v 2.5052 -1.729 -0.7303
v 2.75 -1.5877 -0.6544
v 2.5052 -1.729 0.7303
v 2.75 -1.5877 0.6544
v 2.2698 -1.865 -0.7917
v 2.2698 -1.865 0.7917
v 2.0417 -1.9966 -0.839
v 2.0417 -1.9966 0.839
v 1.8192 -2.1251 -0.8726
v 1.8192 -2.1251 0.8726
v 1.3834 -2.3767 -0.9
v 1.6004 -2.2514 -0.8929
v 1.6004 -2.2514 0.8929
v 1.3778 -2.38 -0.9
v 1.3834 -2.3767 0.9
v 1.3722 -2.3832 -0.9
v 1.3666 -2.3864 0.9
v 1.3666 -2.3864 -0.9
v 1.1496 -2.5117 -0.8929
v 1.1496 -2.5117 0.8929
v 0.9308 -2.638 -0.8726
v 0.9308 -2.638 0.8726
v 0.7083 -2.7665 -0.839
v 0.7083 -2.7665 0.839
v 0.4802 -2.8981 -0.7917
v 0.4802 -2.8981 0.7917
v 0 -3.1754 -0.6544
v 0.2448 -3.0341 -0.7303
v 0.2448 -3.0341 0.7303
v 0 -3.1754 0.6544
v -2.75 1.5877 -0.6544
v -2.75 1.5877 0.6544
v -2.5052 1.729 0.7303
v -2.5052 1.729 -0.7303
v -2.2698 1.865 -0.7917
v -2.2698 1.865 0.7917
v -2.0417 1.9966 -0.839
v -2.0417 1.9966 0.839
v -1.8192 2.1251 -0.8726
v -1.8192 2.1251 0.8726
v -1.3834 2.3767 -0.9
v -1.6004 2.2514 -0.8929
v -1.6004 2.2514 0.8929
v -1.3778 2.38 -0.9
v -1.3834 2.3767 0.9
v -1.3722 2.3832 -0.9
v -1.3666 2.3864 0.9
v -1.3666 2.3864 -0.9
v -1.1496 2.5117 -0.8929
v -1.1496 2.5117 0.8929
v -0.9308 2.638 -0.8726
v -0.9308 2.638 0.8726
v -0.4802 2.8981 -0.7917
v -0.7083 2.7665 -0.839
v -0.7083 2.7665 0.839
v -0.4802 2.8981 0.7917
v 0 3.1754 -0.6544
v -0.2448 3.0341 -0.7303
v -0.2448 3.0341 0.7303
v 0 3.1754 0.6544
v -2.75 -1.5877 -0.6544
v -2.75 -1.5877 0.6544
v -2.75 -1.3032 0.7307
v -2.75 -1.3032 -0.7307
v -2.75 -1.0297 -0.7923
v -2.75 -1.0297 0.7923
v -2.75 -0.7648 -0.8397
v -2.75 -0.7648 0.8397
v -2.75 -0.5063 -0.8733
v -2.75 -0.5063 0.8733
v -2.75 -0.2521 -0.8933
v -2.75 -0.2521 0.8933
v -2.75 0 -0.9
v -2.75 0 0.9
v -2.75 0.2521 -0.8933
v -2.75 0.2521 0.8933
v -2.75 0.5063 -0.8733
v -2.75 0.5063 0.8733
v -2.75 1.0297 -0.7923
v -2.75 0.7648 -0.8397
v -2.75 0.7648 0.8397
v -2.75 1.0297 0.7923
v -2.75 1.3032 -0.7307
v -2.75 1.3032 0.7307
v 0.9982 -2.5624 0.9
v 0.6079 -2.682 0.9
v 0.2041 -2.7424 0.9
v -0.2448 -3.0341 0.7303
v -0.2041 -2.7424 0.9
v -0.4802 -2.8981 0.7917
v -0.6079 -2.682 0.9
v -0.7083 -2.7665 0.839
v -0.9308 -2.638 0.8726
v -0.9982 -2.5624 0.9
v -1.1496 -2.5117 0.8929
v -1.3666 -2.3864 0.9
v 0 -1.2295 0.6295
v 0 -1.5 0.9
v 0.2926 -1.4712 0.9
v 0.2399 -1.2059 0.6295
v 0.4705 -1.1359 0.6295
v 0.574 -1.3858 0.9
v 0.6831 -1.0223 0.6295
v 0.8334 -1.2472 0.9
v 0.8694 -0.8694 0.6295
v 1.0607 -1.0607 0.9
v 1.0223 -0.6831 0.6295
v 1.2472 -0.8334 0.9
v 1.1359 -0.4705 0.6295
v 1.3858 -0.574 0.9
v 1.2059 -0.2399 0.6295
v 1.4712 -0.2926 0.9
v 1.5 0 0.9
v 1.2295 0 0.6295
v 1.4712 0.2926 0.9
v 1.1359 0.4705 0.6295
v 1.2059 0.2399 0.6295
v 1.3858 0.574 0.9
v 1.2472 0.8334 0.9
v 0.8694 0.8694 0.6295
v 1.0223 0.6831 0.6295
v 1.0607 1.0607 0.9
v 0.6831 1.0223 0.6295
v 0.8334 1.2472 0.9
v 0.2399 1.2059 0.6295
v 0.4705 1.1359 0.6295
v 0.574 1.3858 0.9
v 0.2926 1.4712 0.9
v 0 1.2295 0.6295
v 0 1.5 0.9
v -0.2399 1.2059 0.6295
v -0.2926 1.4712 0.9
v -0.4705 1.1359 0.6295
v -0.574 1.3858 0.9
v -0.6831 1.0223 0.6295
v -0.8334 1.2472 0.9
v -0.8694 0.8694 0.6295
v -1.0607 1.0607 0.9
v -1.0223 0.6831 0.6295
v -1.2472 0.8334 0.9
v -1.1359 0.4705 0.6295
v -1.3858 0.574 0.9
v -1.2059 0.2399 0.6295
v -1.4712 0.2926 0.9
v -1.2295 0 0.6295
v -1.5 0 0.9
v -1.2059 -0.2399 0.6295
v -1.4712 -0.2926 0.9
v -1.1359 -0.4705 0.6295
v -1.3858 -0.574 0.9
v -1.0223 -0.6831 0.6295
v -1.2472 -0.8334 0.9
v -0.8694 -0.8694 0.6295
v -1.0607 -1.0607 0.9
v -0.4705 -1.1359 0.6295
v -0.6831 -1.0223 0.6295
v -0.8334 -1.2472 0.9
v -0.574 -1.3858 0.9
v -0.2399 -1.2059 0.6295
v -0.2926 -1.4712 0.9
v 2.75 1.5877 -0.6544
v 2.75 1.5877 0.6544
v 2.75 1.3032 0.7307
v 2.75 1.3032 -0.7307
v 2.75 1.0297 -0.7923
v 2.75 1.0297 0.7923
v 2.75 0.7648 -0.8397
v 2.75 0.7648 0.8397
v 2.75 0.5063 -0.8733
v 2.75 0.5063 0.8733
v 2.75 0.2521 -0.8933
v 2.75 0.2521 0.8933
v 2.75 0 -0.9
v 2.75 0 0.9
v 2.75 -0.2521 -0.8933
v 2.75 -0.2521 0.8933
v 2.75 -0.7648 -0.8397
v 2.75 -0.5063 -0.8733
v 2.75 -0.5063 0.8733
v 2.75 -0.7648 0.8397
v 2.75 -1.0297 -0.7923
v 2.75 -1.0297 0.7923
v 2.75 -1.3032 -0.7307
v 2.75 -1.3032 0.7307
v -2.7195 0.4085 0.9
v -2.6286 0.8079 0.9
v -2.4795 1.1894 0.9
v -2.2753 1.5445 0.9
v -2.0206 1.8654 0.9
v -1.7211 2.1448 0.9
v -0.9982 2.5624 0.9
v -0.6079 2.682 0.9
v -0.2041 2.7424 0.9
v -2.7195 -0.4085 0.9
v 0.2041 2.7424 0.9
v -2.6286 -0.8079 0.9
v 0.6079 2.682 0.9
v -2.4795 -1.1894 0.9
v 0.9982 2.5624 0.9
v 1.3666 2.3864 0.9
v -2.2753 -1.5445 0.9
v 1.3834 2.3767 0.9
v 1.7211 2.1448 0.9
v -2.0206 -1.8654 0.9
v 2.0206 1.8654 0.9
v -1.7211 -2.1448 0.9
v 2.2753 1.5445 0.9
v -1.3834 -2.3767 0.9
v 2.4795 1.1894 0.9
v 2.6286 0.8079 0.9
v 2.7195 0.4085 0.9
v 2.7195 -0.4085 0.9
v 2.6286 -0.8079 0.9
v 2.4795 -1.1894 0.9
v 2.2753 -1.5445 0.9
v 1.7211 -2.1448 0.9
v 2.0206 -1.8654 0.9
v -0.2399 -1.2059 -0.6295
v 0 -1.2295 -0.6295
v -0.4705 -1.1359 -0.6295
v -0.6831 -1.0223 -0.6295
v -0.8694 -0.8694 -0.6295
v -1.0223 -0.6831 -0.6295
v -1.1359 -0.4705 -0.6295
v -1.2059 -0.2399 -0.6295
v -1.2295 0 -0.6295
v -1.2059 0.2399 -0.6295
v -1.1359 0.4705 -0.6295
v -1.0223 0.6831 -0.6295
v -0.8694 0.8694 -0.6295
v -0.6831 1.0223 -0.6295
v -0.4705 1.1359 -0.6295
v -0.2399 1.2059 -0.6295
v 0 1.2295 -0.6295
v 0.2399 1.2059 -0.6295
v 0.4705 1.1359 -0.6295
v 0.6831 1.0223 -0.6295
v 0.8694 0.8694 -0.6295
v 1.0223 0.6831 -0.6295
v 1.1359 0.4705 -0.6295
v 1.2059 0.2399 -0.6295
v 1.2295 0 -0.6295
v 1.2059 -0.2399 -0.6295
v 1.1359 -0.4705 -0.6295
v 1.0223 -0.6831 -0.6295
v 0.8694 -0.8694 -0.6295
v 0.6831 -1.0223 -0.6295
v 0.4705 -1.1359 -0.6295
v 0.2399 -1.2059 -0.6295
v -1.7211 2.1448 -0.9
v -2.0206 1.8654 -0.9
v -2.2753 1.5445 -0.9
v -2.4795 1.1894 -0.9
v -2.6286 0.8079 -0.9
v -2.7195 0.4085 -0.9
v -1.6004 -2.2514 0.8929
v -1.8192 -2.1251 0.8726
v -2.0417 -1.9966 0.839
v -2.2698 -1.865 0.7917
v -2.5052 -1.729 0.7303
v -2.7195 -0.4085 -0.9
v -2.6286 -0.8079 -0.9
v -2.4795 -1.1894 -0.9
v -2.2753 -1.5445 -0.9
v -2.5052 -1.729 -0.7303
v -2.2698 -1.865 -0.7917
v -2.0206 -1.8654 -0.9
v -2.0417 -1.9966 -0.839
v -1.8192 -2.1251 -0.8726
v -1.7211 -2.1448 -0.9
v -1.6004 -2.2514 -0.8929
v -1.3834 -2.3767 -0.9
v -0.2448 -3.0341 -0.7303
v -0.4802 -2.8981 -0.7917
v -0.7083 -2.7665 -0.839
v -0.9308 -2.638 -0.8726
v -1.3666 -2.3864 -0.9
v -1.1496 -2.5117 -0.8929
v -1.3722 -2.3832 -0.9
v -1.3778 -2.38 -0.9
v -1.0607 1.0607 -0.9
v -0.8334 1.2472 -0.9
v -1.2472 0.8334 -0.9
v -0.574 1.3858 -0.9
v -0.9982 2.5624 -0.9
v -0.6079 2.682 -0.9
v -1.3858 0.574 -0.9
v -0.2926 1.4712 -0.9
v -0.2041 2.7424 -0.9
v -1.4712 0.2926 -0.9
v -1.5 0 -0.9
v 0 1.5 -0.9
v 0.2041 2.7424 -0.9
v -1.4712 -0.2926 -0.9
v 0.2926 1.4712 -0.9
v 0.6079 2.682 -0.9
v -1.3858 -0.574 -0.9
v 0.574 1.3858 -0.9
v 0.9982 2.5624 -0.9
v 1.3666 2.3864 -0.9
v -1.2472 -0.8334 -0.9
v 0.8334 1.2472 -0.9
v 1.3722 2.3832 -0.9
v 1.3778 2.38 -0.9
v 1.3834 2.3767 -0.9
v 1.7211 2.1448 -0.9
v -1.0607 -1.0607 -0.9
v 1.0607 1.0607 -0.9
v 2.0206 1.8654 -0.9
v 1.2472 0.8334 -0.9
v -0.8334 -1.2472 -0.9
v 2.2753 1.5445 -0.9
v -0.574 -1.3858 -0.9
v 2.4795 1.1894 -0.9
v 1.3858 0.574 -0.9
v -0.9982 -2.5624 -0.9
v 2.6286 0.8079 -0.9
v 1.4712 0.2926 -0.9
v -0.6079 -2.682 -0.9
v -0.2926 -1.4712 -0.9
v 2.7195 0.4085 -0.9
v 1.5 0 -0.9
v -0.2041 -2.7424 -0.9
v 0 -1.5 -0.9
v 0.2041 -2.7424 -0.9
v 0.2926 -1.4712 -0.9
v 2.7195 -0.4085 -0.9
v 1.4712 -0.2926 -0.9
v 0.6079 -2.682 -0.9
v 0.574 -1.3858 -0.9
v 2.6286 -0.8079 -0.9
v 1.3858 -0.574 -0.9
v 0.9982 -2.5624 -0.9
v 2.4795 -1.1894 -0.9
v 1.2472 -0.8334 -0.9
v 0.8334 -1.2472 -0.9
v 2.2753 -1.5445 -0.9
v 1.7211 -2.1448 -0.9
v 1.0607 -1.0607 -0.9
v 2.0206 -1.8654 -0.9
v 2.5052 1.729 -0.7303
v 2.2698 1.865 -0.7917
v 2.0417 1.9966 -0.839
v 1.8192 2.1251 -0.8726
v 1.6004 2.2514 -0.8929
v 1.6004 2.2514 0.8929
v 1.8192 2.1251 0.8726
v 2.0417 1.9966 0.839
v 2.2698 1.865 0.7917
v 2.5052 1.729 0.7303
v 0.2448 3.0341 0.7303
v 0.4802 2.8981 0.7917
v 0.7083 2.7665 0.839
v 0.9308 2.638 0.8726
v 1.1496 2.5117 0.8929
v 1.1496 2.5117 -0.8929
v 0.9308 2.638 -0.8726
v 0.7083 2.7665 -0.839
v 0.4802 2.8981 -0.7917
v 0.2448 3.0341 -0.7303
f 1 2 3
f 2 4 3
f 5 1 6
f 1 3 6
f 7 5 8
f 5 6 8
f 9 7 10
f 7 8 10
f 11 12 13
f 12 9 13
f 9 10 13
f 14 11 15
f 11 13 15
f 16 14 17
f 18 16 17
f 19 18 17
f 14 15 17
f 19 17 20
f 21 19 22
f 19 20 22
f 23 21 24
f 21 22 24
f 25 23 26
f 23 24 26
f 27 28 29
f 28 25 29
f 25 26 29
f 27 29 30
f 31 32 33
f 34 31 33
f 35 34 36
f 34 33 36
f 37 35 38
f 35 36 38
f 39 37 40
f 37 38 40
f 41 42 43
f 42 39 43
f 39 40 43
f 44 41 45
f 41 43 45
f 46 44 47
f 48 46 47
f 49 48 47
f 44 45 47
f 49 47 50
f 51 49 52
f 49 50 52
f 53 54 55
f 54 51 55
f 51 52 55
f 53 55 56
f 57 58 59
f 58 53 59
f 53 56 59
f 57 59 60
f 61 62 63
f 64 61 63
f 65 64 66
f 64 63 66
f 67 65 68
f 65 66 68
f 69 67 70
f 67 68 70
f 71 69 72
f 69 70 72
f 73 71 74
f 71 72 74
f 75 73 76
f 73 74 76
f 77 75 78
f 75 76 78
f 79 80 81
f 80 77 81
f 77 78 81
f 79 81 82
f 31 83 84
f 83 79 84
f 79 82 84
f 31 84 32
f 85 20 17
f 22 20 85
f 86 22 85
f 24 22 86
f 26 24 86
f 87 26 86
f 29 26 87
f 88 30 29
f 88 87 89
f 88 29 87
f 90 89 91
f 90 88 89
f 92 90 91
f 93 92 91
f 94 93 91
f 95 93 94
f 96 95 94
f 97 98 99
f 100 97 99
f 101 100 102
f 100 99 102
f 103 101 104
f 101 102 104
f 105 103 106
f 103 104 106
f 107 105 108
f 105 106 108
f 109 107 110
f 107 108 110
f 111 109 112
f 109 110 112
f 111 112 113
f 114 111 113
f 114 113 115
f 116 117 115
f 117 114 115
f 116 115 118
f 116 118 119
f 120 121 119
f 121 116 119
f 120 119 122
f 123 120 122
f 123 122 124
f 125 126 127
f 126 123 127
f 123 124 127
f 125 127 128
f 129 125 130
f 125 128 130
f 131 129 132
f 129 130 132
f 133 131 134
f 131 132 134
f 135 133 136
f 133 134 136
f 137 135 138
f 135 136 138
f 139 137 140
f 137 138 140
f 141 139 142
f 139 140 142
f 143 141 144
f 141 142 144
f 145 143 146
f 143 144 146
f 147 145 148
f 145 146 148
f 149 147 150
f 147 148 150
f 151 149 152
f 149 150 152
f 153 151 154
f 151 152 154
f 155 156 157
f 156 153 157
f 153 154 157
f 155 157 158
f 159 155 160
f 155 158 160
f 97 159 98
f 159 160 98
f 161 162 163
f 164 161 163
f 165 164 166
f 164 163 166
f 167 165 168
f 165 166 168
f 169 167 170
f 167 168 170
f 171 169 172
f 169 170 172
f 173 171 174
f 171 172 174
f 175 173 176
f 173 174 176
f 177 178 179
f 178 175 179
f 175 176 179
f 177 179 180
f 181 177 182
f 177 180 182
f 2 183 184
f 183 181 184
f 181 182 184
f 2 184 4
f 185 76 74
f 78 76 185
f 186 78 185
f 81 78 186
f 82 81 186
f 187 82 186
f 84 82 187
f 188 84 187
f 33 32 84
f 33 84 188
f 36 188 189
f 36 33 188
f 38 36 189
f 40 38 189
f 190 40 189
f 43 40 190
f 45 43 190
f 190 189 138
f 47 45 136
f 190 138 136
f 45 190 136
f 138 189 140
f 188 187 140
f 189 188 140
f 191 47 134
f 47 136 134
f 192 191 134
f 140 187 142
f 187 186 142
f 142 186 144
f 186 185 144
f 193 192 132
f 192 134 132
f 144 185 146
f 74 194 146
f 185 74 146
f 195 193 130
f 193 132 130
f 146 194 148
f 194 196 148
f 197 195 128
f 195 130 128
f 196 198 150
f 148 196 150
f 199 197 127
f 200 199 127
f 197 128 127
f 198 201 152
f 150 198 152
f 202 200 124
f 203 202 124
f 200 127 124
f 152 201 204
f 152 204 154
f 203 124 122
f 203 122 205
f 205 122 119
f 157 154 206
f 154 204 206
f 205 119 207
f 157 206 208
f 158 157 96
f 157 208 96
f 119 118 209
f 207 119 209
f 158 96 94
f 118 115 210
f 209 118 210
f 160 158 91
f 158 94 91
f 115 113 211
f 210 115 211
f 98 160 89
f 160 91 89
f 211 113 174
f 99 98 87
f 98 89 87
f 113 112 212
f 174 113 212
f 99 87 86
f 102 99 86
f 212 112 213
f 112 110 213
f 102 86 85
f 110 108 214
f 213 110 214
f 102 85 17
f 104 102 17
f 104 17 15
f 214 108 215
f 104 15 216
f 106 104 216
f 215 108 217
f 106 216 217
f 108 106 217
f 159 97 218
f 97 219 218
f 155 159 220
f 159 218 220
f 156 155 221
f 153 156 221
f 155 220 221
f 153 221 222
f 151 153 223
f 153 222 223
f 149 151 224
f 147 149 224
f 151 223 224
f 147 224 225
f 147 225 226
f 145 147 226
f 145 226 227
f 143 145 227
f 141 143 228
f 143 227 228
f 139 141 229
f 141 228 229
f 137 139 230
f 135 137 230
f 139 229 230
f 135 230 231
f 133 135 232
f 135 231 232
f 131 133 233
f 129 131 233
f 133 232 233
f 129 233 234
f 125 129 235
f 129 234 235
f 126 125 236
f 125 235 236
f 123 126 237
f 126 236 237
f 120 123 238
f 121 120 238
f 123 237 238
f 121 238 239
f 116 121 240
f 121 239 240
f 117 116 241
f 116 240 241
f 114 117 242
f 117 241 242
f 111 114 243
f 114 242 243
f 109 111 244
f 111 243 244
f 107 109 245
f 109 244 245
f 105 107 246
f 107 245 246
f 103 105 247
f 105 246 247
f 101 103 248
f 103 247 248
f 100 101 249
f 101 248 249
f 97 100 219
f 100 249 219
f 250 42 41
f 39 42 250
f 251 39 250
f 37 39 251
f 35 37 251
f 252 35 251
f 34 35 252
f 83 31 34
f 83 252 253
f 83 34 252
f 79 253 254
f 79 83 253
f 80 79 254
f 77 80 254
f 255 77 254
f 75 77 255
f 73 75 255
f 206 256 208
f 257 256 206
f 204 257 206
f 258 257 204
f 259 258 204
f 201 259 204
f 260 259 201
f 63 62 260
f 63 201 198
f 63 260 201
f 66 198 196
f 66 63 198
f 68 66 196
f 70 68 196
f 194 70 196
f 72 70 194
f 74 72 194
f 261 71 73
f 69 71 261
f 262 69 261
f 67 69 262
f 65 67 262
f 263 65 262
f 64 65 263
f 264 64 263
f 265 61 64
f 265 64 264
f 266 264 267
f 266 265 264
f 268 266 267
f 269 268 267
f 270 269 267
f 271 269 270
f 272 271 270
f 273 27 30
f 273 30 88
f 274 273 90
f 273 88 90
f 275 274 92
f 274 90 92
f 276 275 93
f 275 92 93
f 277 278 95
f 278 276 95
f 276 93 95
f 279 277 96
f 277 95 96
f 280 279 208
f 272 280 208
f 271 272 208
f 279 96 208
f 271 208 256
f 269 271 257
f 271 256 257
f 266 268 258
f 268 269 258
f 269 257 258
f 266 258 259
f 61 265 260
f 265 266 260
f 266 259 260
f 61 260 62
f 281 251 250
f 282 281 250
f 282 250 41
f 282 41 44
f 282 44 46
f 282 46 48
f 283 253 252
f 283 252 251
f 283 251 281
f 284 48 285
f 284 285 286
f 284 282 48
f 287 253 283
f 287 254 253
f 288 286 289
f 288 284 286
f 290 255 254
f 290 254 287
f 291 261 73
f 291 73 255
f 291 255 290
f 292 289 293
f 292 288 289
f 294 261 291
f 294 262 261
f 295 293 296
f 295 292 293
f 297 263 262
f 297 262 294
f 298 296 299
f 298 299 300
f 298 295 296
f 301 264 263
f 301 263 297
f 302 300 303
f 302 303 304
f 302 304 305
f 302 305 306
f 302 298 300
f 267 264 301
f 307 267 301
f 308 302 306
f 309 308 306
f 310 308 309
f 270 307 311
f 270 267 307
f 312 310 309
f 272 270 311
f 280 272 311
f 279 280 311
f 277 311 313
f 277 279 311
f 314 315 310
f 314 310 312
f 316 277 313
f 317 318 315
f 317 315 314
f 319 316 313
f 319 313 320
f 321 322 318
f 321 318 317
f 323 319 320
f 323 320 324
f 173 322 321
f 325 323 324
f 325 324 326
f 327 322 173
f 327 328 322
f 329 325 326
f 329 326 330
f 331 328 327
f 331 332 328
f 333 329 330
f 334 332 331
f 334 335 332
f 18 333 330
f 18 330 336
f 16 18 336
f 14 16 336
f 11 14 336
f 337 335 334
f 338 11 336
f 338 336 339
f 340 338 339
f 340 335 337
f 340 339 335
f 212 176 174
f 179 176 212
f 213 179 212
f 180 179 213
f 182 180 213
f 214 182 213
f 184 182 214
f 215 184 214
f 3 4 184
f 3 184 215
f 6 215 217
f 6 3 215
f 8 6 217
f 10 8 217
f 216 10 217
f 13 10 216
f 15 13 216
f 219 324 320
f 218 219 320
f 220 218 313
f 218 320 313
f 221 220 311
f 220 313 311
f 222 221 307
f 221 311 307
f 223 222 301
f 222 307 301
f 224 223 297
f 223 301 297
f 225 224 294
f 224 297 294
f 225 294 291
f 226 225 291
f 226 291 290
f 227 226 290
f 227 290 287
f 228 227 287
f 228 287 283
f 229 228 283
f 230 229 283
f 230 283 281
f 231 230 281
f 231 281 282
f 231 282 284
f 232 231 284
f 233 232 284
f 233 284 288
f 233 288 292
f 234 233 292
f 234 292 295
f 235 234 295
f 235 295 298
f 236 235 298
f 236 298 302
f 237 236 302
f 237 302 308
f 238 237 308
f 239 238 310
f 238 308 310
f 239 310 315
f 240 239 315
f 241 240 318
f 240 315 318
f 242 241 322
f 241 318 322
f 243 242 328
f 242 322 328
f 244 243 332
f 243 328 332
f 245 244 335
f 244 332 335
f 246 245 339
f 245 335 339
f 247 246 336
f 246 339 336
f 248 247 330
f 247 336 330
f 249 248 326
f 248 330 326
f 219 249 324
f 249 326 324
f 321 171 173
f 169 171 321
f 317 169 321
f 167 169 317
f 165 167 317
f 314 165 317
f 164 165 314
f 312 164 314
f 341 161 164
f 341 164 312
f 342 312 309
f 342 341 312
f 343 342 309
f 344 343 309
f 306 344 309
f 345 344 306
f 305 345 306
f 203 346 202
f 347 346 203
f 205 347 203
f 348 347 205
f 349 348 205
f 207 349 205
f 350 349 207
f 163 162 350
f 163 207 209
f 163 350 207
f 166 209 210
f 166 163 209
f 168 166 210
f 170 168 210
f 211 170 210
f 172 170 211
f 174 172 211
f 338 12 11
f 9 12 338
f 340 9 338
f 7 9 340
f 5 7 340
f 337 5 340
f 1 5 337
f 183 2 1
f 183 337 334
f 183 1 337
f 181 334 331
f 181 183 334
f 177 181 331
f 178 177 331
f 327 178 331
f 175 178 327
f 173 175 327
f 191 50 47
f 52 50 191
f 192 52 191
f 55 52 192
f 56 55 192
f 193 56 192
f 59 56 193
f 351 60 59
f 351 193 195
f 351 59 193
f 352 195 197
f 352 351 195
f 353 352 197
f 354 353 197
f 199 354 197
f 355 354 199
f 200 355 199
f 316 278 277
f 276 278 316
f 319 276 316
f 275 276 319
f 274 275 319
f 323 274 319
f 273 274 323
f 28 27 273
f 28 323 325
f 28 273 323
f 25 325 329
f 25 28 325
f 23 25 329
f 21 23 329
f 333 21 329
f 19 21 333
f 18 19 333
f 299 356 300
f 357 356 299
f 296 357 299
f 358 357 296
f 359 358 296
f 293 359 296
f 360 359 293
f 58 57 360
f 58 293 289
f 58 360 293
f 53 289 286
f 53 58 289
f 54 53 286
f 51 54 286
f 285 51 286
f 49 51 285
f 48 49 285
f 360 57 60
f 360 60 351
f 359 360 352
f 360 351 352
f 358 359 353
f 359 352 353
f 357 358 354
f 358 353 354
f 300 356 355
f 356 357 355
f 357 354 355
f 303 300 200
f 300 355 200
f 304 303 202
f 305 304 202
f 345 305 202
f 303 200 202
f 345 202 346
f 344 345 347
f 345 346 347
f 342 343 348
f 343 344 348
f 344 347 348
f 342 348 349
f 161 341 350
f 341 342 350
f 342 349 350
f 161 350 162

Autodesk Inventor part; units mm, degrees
ref_plane "YZ Plane" through (0, 0, 0) normal (1, 0, 0) x (0, 1, 0)
ref_plane "XZ Plane" through (0, 0, 0) normal (0, 1, 0) x (-1, 0, 0)
ref_plane "XY Plane" through (0, 0, 0) normal (0, 0, 1) x (1, 0, 0)
sketch "Sketch1" plane through (0, 0, 0) normal (0, 1, 0) x (-1, 0, 0)
  line L0 (0, 0.9) -> (0, -0.9)
  line L1 (0, -0.9) -> (-2.75, -0.9)
  line L2 (-3.1754, -0.6544) -> (-3.1754, 0.6544)
  line L3 (-2.75, 0.9) -> (0, 0.9)
  line L4 (-2.75, 0.9) -> (-3.1754, 0.6544)
  line L5 (-2.75, -0.9) -> (-3.1754, -0.6544)
  line L6 (0, 0) -> (-3.1754, 0) construction
  dimension "d0" = 1.8
  dimension "d1" = 5.5
  dimension "d2" = 6.3509
  dimension "d3" = 30
revolve "Revolution1" add sketch "Sketch1" angle 360 about axis through (0, 0, 0.9) along (0, 0, -1)
sketch "Sketch2" plane through (0, 0, 0.9) normal (0, 0, 1) x (1, 0, 0)
  circle A0 centre (0, 0) radius 3.1754 projected
  line L0 (0, 3.1754) -> (2.75, 1.5877)
  line L1 (2.75, 1.5877) -> (2.75, -1.5877)
  line L2 (2.75, -1.5877) -> (0, -3.1754)
  line L3 (0, -3.1754) -> (-2.75, -1.5877)
  line L4 (-2.75, -1.5877) -> (-2.75, 1.5877)
  line L5 (-2.75, 1.5877) -> (0, 3.1754)
  point P0 (0, 0)
  point P1 (0, 0)
  point P2 (0, 0)
  point P3 (-2.75, -1.5877)
  point P4 (-2.75, -1.5877)
  point P5 (0, -3.1754)
  point P6 (0, -3.1754)
extrude "Extrusion1" cut sketch "Sketch2" against normal through all contours A0 L1 | L0 A0 | A0 L2 | L5 A0 | A0 L3 | L4 A0
hole "Hole1" at (0, 0, 0.9) direction (0, 0, -1) diameter 2.459 depth 6 countersink diameter 3 countersink angle 90 thread size "M3x0.5" class "6H" standard "ANSI Metric M Profile"
mirror "Mirror1" about plane through (0, 0, 0) normal (0, 0, 1) of "Hole1"
equation "\"d2\" = 1.1547 * d1"
properties part number "UNT-03-3" material "Stainless Steel AISI 304"
